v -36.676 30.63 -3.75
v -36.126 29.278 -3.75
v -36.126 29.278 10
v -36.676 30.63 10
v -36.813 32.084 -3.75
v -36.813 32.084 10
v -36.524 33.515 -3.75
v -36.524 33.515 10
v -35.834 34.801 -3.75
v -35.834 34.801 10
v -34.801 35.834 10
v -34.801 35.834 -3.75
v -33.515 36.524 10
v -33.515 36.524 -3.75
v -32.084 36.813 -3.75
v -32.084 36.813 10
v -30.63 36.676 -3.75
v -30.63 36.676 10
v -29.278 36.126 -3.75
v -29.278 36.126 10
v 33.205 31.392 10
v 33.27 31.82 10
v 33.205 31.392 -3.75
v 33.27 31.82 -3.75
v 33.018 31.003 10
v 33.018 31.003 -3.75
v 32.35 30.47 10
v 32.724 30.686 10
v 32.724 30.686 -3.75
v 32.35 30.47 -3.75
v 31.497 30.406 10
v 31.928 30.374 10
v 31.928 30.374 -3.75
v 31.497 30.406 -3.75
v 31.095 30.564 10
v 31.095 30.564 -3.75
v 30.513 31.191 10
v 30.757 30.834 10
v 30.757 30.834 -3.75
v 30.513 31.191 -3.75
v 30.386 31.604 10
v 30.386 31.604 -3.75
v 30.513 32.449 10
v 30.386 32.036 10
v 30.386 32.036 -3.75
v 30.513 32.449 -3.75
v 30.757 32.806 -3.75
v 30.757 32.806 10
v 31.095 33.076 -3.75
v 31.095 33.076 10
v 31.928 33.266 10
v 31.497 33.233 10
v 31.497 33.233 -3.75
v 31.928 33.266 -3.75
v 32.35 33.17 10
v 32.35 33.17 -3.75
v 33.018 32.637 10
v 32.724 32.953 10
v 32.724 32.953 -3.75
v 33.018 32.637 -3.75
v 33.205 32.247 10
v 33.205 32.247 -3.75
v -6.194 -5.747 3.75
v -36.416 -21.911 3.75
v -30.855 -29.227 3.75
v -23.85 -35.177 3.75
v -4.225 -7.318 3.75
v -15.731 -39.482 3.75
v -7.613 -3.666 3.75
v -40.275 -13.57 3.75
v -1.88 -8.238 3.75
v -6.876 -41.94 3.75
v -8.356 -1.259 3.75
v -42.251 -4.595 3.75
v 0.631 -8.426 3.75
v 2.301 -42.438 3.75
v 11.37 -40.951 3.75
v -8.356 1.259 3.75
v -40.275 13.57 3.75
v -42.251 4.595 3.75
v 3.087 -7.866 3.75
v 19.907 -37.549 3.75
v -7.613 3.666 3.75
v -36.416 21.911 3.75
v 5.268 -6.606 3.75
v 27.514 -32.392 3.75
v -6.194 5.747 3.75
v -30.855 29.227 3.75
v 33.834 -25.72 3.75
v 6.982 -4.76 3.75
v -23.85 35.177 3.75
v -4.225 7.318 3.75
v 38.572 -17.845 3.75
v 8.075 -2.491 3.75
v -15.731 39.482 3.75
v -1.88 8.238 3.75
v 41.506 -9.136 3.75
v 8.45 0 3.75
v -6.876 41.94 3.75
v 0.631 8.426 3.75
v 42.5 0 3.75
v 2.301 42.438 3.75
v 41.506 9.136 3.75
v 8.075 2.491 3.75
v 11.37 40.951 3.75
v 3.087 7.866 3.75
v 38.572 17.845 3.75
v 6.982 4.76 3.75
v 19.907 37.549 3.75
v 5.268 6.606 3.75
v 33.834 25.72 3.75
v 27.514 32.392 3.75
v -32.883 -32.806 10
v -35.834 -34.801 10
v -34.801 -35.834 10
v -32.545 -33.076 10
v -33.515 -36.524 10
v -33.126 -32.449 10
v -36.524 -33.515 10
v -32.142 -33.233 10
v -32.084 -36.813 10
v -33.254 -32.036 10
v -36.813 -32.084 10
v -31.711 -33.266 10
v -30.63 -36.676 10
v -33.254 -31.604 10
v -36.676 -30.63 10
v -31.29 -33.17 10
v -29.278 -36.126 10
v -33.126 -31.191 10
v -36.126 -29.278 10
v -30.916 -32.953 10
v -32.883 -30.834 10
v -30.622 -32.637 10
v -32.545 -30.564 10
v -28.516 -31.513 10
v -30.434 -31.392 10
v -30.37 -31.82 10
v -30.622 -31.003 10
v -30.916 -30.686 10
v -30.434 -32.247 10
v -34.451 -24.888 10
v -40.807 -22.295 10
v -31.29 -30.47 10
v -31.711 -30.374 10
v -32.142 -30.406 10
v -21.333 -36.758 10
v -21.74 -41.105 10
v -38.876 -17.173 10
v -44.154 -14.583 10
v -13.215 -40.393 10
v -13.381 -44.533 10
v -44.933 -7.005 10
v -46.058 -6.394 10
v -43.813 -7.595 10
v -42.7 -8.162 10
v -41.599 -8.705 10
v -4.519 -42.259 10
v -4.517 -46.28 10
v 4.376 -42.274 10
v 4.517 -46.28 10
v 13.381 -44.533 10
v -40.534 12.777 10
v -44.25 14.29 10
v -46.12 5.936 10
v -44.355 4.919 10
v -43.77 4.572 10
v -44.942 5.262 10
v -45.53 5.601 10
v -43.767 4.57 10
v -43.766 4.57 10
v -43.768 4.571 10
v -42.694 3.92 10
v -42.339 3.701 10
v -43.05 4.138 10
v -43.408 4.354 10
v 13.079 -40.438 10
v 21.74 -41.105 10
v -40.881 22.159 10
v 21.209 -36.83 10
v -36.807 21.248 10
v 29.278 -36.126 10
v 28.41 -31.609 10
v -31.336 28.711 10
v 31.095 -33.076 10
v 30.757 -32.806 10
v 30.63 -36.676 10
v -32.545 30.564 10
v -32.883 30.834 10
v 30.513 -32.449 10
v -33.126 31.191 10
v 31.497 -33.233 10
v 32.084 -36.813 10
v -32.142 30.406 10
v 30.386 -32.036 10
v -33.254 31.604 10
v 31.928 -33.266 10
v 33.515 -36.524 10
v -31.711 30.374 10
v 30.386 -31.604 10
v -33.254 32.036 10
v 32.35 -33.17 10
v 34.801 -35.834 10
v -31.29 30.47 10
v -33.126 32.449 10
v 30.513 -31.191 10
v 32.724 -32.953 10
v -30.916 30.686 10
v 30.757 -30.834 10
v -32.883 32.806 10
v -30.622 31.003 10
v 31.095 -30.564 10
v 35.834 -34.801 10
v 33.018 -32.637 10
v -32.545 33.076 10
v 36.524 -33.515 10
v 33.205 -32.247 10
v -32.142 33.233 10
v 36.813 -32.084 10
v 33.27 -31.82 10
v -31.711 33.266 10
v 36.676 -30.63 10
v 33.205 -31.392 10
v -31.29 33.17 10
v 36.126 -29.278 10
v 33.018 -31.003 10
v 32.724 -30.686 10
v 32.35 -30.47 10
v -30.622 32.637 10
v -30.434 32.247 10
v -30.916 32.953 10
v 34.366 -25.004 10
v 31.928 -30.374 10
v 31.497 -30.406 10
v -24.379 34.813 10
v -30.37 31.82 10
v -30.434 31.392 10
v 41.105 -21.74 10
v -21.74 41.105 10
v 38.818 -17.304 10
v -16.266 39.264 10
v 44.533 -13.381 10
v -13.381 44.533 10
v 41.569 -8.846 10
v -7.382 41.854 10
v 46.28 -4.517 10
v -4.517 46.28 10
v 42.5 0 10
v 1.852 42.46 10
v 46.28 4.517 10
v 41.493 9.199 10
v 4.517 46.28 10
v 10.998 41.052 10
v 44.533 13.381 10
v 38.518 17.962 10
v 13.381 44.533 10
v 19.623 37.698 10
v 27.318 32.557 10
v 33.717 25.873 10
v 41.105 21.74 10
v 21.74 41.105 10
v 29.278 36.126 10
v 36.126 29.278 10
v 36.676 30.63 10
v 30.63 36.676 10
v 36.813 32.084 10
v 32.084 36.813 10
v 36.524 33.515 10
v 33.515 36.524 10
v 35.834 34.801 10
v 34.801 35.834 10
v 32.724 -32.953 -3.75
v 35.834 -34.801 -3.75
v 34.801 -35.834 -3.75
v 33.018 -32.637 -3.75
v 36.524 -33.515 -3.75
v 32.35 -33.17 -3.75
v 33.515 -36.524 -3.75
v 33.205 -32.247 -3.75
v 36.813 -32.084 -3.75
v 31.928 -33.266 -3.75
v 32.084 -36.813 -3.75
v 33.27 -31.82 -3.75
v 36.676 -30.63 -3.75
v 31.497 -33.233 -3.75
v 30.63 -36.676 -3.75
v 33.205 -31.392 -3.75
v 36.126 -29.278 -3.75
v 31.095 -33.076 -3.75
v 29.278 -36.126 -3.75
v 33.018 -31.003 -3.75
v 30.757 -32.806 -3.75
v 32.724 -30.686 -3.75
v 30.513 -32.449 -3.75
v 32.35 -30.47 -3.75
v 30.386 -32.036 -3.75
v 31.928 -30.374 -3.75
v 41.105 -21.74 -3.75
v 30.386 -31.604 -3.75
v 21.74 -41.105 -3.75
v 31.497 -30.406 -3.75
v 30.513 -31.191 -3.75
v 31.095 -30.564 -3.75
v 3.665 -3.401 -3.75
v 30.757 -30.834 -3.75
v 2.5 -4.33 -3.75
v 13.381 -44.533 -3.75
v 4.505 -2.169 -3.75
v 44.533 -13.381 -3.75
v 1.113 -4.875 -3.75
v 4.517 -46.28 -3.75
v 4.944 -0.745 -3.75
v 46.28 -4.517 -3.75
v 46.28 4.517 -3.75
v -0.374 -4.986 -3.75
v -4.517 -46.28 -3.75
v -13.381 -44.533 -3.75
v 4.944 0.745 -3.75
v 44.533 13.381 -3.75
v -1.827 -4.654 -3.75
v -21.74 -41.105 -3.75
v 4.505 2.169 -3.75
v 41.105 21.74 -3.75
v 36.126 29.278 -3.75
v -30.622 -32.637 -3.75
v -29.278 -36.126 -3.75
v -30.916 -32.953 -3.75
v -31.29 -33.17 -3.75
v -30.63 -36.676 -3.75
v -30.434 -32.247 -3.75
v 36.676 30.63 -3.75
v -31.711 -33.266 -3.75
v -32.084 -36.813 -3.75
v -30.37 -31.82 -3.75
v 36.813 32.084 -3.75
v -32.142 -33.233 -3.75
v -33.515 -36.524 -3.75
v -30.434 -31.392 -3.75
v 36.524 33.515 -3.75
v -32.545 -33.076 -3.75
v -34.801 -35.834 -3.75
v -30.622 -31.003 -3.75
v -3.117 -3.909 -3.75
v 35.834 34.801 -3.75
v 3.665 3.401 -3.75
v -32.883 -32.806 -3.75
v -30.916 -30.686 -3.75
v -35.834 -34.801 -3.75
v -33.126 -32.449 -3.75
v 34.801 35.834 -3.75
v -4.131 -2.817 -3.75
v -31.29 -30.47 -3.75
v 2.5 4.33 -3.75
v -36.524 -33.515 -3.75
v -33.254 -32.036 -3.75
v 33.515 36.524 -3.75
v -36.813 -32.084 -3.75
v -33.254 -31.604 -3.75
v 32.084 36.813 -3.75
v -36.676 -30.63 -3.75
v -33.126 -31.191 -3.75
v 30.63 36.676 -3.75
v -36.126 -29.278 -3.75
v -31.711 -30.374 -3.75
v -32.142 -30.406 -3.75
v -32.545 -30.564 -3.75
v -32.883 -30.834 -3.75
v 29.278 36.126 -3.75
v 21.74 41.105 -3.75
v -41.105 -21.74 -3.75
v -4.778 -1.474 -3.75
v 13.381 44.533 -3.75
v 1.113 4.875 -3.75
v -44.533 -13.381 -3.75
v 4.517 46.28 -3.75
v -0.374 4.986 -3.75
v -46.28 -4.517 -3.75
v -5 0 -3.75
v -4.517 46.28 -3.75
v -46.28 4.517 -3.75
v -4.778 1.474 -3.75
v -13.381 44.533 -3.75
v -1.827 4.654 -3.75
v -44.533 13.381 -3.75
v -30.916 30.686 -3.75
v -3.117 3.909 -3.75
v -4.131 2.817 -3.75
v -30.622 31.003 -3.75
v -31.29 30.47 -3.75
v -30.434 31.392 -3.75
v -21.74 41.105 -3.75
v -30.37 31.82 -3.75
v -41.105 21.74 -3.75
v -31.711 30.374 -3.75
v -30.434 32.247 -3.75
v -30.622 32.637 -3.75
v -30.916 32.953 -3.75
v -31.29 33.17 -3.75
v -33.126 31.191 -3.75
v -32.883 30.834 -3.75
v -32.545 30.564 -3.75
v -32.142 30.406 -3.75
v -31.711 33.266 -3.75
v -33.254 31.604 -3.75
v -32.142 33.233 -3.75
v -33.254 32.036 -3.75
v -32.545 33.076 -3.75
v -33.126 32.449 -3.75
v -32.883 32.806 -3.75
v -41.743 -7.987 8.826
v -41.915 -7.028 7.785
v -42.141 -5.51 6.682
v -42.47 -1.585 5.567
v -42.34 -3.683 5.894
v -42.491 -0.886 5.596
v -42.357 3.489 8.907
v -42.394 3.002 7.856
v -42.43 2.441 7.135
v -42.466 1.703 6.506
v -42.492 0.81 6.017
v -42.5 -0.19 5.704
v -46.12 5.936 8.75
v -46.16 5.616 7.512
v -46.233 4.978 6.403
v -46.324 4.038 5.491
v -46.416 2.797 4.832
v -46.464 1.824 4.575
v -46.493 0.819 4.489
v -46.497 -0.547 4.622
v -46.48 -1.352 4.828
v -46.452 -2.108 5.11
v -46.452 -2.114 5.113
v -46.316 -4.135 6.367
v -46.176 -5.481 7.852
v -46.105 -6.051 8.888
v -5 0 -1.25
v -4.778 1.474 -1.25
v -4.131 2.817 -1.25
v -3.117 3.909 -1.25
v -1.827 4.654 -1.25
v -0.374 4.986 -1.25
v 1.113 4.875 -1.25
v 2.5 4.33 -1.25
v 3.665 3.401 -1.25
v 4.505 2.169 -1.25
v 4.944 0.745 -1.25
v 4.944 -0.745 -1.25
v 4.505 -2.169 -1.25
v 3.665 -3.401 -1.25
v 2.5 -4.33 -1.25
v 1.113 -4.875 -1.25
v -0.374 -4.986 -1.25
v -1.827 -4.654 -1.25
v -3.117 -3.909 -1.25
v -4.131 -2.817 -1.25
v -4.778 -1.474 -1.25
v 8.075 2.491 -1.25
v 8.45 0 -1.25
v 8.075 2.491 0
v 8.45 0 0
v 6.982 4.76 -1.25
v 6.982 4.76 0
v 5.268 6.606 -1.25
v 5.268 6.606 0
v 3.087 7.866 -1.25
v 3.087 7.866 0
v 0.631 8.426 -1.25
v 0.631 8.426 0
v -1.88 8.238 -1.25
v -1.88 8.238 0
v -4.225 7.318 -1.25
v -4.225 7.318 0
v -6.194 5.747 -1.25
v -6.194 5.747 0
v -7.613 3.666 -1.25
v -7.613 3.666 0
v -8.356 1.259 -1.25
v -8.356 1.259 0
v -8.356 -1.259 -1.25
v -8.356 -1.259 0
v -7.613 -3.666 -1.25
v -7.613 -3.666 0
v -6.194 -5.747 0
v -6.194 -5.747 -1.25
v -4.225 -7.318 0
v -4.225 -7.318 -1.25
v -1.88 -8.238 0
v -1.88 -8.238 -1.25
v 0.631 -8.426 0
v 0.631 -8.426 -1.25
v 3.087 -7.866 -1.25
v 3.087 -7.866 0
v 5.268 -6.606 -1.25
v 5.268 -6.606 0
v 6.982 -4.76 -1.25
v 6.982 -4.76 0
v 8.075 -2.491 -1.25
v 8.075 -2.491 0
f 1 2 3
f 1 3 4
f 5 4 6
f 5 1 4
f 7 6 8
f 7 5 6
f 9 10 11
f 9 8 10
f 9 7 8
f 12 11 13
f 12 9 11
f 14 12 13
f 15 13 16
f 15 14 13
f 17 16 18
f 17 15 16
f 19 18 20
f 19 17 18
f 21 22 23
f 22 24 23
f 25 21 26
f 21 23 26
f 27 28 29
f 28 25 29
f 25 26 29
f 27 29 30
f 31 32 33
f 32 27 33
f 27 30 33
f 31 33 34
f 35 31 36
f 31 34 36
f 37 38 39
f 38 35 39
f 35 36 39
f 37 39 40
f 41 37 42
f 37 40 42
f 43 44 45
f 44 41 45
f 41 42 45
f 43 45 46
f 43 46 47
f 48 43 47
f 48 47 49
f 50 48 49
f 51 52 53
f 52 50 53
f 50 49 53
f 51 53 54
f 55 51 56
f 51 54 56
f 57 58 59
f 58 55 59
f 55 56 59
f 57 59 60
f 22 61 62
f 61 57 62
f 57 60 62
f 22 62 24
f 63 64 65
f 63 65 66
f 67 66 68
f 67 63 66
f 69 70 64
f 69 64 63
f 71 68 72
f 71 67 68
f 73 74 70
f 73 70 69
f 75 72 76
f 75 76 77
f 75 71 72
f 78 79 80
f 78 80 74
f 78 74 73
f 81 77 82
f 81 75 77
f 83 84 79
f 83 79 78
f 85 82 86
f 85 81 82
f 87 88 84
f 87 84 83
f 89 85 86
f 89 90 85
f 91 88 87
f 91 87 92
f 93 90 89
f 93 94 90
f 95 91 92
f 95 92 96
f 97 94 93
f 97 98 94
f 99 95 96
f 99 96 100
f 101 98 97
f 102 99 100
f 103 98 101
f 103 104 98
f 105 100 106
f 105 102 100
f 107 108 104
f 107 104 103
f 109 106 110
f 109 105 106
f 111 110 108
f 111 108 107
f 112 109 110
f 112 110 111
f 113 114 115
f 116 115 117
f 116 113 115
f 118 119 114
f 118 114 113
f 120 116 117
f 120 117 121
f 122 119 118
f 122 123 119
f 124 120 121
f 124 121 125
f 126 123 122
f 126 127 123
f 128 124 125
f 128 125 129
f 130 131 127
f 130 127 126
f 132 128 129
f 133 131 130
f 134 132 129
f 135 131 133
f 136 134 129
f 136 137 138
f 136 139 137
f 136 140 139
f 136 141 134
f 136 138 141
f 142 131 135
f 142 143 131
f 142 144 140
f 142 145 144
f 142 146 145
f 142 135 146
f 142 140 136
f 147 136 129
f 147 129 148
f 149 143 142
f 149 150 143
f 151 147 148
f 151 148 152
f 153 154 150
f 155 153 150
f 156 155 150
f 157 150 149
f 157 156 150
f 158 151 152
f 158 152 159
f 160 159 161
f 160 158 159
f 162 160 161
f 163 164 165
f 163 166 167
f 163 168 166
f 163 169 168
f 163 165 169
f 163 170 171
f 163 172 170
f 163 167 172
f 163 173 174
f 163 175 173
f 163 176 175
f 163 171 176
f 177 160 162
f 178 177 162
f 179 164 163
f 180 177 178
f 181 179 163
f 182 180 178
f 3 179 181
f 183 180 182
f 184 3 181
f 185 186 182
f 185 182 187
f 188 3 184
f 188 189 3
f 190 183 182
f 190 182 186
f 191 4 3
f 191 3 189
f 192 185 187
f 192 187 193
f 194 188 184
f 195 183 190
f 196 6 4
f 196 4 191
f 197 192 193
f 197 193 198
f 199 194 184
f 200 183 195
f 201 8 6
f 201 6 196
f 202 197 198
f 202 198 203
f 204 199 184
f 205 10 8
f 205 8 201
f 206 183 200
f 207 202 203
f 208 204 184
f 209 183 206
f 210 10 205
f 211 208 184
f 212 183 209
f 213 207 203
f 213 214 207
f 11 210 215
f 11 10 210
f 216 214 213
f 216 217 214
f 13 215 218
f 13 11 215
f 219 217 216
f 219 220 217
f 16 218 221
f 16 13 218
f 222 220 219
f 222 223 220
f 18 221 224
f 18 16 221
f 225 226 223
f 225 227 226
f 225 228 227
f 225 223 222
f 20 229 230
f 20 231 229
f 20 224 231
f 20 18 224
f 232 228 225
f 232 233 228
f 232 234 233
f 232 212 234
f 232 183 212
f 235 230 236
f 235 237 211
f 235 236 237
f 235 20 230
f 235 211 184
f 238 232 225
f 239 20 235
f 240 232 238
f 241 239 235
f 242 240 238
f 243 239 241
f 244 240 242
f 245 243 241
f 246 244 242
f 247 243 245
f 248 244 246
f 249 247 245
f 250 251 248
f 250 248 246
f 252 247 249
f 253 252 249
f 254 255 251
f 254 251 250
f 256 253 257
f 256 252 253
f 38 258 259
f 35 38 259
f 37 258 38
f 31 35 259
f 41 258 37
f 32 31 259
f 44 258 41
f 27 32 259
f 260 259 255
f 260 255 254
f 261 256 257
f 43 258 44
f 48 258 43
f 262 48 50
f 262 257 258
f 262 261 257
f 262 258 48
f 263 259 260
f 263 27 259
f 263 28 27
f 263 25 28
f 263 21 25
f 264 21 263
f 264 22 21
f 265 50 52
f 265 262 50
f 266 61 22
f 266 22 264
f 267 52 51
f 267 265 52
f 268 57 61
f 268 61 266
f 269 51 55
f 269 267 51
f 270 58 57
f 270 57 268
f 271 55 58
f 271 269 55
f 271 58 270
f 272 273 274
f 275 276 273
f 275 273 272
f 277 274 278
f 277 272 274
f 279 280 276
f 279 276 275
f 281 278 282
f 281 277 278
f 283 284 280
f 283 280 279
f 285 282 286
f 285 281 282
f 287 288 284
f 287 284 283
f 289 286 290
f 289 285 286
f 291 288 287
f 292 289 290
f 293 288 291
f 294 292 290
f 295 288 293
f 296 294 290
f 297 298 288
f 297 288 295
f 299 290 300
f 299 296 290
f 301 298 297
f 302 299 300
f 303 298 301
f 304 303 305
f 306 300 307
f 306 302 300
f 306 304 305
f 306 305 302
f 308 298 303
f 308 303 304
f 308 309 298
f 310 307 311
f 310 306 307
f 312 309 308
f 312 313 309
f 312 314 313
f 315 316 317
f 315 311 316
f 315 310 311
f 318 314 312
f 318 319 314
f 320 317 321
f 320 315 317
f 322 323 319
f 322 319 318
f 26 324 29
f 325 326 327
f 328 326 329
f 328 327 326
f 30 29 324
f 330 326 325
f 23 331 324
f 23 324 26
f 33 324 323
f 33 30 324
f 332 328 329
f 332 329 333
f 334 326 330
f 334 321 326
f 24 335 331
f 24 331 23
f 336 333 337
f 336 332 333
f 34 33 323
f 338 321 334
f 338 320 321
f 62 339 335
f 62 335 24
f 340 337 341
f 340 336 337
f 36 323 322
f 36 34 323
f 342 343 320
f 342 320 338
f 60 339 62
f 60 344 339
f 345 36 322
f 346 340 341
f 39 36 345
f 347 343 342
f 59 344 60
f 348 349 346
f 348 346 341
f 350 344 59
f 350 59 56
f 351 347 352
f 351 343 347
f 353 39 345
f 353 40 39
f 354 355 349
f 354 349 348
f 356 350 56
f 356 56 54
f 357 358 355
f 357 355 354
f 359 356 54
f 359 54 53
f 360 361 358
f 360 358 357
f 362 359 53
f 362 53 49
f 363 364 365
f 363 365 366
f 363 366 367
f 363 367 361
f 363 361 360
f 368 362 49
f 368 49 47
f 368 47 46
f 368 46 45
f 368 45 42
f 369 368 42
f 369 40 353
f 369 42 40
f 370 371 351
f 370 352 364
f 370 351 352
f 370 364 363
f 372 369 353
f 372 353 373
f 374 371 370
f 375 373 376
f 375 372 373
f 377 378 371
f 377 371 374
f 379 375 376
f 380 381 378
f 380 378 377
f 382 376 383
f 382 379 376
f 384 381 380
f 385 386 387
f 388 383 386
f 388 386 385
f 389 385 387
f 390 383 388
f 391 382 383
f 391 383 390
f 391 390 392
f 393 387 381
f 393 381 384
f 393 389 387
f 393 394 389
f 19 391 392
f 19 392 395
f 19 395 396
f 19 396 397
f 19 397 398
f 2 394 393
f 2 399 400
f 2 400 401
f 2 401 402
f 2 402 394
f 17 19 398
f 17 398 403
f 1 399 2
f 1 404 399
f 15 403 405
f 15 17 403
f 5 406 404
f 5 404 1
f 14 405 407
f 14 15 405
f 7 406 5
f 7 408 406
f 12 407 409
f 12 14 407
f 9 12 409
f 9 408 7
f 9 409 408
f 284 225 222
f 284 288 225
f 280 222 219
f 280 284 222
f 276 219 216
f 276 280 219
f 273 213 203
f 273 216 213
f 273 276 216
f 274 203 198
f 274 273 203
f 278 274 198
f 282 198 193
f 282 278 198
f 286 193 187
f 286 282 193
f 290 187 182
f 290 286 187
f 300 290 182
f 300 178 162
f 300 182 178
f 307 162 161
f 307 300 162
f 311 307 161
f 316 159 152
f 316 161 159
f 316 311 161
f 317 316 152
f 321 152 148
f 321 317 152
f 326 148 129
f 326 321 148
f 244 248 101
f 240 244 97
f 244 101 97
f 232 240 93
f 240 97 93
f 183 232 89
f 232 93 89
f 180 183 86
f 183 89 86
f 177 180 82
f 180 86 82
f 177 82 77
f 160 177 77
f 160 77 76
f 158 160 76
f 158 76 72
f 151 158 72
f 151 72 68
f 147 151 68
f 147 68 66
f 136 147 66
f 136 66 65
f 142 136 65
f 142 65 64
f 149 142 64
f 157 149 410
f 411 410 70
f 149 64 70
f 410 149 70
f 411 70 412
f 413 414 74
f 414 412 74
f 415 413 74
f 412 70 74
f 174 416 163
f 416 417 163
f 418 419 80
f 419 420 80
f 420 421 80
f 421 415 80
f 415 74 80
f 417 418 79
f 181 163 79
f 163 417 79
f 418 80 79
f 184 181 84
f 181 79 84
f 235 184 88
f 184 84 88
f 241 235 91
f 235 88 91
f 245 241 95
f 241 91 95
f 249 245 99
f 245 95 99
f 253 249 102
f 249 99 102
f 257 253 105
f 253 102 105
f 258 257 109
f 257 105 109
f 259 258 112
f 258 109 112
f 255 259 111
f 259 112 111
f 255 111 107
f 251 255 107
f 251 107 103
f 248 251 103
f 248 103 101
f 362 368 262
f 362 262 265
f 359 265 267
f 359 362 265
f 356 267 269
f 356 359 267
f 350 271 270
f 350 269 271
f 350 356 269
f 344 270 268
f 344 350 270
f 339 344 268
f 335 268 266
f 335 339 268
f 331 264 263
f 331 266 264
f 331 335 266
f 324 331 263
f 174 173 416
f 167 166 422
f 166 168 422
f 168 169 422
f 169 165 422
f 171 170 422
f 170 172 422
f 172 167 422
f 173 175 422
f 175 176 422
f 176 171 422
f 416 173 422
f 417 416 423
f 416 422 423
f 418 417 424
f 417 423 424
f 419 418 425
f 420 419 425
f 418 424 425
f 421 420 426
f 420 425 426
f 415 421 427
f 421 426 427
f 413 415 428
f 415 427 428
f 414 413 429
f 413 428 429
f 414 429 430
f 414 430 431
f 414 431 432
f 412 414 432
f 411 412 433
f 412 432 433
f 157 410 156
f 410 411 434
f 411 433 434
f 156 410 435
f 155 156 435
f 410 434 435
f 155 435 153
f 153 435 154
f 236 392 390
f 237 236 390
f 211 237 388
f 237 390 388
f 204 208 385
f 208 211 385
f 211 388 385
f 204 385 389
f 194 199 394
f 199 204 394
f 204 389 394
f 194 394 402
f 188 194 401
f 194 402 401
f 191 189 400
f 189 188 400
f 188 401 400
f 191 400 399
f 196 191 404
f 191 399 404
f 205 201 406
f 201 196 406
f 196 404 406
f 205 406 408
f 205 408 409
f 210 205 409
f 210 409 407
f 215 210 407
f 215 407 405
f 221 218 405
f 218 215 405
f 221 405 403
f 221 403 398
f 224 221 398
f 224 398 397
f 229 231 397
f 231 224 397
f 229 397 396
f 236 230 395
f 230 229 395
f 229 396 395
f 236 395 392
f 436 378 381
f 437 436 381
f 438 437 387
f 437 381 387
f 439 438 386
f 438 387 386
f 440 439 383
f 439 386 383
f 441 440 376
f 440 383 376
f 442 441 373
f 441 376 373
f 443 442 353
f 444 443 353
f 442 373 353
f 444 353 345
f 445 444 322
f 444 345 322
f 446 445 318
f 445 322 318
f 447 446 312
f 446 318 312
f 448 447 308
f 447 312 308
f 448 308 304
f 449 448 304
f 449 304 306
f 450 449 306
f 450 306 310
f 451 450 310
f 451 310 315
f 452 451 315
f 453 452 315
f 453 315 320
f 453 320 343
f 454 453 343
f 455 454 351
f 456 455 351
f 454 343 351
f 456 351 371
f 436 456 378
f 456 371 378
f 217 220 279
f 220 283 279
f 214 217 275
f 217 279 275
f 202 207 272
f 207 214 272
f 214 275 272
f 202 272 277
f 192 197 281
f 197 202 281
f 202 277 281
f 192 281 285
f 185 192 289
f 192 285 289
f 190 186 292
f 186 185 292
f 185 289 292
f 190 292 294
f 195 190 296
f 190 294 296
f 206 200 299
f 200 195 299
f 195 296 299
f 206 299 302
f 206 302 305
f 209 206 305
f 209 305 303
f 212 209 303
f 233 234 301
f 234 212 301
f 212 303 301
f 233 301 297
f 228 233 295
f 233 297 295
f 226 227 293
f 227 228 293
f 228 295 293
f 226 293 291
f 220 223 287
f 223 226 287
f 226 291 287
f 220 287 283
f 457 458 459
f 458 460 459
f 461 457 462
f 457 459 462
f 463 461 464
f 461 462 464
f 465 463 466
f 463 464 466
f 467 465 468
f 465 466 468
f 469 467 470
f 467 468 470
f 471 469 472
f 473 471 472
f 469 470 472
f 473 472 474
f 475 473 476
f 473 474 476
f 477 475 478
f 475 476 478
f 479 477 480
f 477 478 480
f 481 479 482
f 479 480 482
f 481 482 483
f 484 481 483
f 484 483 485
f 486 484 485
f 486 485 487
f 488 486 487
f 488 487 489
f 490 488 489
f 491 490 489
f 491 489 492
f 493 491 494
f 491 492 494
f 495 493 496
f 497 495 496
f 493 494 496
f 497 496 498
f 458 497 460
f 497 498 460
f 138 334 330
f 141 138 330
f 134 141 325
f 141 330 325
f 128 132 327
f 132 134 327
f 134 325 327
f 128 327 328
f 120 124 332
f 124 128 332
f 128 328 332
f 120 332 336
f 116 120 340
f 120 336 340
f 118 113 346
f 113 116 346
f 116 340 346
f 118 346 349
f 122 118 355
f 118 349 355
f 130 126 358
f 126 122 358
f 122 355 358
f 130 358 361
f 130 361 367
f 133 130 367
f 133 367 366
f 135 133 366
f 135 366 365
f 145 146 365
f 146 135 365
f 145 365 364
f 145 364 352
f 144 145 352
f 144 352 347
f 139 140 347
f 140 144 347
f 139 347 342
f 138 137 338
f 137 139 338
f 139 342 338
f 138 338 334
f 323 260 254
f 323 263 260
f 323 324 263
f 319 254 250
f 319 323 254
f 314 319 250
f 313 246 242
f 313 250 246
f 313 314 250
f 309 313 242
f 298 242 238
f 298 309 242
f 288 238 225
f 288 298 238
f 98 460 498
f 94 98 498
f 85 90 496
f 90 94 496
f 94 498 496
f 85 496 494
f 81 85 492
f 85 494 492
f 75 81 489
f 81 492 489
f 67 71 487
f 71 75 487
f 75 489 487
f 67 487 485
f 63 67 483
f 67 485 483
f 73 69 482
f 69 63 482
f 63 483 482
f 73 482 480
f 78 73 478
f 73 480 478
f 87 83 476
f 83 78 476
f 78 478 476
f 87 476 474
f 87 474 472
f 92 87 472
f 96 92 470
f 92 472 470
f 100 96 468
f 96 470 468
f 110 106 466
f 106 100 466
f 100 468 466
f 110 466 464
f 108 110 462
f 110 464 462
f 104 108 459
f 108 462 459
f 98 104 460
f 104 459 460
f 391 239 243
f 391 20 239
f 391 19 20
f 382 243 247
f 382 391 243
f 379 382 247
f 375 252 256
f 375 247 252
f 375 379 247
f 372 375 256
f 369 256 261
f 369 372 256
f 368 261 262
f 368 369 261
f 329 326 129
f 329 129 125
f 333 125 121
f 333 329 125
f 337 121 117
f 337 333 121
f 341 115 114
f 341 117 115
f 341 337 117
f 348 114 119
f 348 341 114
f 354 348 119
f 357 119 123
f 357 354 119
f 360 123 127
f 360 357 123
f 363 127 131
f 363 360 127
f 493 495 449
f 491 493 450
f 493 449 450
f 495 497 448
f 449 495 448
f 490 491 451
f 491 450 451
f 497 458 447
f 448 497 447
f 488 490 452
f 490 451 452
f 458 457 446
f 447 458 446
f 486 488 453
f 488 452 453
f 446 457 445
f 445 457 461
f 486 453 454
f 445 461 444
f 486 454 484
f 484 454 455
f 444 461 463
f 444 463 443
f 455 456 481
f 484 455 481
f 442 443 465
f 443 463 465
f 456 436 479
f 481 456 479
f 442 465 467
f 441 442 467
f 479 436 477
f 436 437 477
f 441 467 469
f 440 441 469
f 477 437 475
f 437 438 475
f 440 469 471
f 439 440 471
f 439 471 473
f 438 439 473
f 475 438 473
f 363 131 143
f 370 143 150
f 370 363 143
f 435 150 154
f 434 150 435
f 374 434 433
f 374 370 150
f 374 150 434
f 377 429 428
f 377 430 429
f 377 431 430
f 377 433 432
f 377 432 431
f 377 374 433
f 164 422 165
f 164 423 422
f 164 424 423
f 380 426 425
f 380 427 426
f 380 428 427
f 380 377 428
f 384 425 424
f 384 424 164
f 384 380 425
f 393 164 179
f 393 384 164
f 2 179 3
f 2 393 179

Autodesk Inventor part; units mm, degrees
ref_plane "YZ Plane" through (0, 0, 0) normal (1, 0, 0) x (0, 1, 0)
sketch "Sketch1" plane through (0, 0, 0) normal (0, 0, 1) x (1, 0, 0)
  circle A0 centre (0, 0) radius 5
  circle A1 centre (0, 0) radius 8.45
  circle A2 centre (0, 0) radius 42.5
  circle A3 centre (0, 0) radius 45 construction
  circle A4 centre (-31.8198, 31.8198) radius 1.45
  arc A5 (-28.0933, 35.1535) -> (-35.1535, 28.0933) centre (-31.8198, 31.8198) ccw
  arc A6 (-35.1535, -28.0933) -> (-28.0933, -35.1535) centre (-31.8198, -31.8198) ccw
  circle A7 centre (-31.8198, -31.8198) radius 1.45
  arc A8 (28.0933, -35.1535) -> (35.1535, -28.0933) centre (31.8198, -31.8198) ccw
  circle A9 centre (31.8198, -31.8198) radius 1.45
  arc A10 (35.1535, 28.0933) -> (28.0933, 35.1535) centre (31.8198, 31.8198) ccw
  circle A11 centre (31.8198, 31.8198) radius 1.45
  line L0 (-31.8198, 31.8198) -> (31.8198, 31.8198) construction
  arc A12 (29.278, 36.1255) -> (-29.278, 36.1255) centre (0, 0) ccw
  arc A13 (-36.1255, 29.278) -> (-36.1255, -29.278) centre (0, 0) ccw
  arc A14 (-29.278, -36.1255) -> (29.278, -36.1255) centre (0, 0) ccw
  arc A15 (36.1255, -29.278) -> (36.1255, 29.278) centre (0, 0) ccw
  point P0 (0, -46.5)
  point P1 (0, 46.5)
  dimension "d2" = 10
  dimension "d3" = 16.9
  dimension "d4" = 85
  dimension "d5" = 90
  dimension "d6" = 2.9
  dimension "d7" = 5
  dimension "d8" = 360
  dimension "d24" = 93
extrude "Extrusion1" add sketch "Sketch1" against normal blind 3.75 contours A12 A10 A15 A8 A14 A6 A13 A5
extrude "Extrusion2" add sketch "Sketch1" along normal mid plane 7.5 contours A2
extrude "Extrusion3" add sketch "Sketch1" along normal blind 10 contours A12 A10 A15 A8 A14 A6 A13 A5
sketch "Sketch2" plane through (0, 0, 10) normal (0, 0, 1) x (1, 0, 0)
  arc A0 (-36.1255, 29.278) -> (-36.1255, -29.278) centre (0, 0) ccw projected
  line L0 (-46.5, 0) -> (-46.5, -31.8198) construction
  circle A1 centre (-31.8198, -31.8198) radius 1.45 projected
ref_plane "Work Plane1" through (-46.5, 0, 10) normal (-0.9659, 0, -0.2588) x (0, -1, 0)
sketch "Sketch3" plane through (-46.5, 0, 10) normal (-0.9659, 0, -0.2588) x (0, -1, 0)
  line L0 (0, 0) -> (31.8198, 0) projected
  line L1 (0, 0) -> (0, -21.6943) construction
ref_plane "Work Plane2" through (-46.5, 0, 10) normal (-0.8365, 0.5, -0.2241) x (0.2588, 0, -0.9659)
sketch "Sketch4" plane through (-46.5, 0, 10) normal (-0.8365, 0.5, -0.2241) x (0.2588, 0, -0.9659)
  circle A0 centre (0, 0) radius 5.325
  point P0 (21.6943, -21.1637)
  point P1 (0, 0)
  dimension "d20" = 10.65
extrude "Extrusion5" cut sketch "Sketch4" along normal mid plane 20
sketch "Sketch5" plane through (0, 0, -3.75) normal (0, 0, -1) x (-1, 0, 0)
  circle A0 centre (0, 0) radius 5 projected
  circle A1 centre (0, 0) radius 8.45 projected
extrude "Extrusion6" add sketch "Sketch5" against normal blind 2.5
properties part number "Case Part 2"
